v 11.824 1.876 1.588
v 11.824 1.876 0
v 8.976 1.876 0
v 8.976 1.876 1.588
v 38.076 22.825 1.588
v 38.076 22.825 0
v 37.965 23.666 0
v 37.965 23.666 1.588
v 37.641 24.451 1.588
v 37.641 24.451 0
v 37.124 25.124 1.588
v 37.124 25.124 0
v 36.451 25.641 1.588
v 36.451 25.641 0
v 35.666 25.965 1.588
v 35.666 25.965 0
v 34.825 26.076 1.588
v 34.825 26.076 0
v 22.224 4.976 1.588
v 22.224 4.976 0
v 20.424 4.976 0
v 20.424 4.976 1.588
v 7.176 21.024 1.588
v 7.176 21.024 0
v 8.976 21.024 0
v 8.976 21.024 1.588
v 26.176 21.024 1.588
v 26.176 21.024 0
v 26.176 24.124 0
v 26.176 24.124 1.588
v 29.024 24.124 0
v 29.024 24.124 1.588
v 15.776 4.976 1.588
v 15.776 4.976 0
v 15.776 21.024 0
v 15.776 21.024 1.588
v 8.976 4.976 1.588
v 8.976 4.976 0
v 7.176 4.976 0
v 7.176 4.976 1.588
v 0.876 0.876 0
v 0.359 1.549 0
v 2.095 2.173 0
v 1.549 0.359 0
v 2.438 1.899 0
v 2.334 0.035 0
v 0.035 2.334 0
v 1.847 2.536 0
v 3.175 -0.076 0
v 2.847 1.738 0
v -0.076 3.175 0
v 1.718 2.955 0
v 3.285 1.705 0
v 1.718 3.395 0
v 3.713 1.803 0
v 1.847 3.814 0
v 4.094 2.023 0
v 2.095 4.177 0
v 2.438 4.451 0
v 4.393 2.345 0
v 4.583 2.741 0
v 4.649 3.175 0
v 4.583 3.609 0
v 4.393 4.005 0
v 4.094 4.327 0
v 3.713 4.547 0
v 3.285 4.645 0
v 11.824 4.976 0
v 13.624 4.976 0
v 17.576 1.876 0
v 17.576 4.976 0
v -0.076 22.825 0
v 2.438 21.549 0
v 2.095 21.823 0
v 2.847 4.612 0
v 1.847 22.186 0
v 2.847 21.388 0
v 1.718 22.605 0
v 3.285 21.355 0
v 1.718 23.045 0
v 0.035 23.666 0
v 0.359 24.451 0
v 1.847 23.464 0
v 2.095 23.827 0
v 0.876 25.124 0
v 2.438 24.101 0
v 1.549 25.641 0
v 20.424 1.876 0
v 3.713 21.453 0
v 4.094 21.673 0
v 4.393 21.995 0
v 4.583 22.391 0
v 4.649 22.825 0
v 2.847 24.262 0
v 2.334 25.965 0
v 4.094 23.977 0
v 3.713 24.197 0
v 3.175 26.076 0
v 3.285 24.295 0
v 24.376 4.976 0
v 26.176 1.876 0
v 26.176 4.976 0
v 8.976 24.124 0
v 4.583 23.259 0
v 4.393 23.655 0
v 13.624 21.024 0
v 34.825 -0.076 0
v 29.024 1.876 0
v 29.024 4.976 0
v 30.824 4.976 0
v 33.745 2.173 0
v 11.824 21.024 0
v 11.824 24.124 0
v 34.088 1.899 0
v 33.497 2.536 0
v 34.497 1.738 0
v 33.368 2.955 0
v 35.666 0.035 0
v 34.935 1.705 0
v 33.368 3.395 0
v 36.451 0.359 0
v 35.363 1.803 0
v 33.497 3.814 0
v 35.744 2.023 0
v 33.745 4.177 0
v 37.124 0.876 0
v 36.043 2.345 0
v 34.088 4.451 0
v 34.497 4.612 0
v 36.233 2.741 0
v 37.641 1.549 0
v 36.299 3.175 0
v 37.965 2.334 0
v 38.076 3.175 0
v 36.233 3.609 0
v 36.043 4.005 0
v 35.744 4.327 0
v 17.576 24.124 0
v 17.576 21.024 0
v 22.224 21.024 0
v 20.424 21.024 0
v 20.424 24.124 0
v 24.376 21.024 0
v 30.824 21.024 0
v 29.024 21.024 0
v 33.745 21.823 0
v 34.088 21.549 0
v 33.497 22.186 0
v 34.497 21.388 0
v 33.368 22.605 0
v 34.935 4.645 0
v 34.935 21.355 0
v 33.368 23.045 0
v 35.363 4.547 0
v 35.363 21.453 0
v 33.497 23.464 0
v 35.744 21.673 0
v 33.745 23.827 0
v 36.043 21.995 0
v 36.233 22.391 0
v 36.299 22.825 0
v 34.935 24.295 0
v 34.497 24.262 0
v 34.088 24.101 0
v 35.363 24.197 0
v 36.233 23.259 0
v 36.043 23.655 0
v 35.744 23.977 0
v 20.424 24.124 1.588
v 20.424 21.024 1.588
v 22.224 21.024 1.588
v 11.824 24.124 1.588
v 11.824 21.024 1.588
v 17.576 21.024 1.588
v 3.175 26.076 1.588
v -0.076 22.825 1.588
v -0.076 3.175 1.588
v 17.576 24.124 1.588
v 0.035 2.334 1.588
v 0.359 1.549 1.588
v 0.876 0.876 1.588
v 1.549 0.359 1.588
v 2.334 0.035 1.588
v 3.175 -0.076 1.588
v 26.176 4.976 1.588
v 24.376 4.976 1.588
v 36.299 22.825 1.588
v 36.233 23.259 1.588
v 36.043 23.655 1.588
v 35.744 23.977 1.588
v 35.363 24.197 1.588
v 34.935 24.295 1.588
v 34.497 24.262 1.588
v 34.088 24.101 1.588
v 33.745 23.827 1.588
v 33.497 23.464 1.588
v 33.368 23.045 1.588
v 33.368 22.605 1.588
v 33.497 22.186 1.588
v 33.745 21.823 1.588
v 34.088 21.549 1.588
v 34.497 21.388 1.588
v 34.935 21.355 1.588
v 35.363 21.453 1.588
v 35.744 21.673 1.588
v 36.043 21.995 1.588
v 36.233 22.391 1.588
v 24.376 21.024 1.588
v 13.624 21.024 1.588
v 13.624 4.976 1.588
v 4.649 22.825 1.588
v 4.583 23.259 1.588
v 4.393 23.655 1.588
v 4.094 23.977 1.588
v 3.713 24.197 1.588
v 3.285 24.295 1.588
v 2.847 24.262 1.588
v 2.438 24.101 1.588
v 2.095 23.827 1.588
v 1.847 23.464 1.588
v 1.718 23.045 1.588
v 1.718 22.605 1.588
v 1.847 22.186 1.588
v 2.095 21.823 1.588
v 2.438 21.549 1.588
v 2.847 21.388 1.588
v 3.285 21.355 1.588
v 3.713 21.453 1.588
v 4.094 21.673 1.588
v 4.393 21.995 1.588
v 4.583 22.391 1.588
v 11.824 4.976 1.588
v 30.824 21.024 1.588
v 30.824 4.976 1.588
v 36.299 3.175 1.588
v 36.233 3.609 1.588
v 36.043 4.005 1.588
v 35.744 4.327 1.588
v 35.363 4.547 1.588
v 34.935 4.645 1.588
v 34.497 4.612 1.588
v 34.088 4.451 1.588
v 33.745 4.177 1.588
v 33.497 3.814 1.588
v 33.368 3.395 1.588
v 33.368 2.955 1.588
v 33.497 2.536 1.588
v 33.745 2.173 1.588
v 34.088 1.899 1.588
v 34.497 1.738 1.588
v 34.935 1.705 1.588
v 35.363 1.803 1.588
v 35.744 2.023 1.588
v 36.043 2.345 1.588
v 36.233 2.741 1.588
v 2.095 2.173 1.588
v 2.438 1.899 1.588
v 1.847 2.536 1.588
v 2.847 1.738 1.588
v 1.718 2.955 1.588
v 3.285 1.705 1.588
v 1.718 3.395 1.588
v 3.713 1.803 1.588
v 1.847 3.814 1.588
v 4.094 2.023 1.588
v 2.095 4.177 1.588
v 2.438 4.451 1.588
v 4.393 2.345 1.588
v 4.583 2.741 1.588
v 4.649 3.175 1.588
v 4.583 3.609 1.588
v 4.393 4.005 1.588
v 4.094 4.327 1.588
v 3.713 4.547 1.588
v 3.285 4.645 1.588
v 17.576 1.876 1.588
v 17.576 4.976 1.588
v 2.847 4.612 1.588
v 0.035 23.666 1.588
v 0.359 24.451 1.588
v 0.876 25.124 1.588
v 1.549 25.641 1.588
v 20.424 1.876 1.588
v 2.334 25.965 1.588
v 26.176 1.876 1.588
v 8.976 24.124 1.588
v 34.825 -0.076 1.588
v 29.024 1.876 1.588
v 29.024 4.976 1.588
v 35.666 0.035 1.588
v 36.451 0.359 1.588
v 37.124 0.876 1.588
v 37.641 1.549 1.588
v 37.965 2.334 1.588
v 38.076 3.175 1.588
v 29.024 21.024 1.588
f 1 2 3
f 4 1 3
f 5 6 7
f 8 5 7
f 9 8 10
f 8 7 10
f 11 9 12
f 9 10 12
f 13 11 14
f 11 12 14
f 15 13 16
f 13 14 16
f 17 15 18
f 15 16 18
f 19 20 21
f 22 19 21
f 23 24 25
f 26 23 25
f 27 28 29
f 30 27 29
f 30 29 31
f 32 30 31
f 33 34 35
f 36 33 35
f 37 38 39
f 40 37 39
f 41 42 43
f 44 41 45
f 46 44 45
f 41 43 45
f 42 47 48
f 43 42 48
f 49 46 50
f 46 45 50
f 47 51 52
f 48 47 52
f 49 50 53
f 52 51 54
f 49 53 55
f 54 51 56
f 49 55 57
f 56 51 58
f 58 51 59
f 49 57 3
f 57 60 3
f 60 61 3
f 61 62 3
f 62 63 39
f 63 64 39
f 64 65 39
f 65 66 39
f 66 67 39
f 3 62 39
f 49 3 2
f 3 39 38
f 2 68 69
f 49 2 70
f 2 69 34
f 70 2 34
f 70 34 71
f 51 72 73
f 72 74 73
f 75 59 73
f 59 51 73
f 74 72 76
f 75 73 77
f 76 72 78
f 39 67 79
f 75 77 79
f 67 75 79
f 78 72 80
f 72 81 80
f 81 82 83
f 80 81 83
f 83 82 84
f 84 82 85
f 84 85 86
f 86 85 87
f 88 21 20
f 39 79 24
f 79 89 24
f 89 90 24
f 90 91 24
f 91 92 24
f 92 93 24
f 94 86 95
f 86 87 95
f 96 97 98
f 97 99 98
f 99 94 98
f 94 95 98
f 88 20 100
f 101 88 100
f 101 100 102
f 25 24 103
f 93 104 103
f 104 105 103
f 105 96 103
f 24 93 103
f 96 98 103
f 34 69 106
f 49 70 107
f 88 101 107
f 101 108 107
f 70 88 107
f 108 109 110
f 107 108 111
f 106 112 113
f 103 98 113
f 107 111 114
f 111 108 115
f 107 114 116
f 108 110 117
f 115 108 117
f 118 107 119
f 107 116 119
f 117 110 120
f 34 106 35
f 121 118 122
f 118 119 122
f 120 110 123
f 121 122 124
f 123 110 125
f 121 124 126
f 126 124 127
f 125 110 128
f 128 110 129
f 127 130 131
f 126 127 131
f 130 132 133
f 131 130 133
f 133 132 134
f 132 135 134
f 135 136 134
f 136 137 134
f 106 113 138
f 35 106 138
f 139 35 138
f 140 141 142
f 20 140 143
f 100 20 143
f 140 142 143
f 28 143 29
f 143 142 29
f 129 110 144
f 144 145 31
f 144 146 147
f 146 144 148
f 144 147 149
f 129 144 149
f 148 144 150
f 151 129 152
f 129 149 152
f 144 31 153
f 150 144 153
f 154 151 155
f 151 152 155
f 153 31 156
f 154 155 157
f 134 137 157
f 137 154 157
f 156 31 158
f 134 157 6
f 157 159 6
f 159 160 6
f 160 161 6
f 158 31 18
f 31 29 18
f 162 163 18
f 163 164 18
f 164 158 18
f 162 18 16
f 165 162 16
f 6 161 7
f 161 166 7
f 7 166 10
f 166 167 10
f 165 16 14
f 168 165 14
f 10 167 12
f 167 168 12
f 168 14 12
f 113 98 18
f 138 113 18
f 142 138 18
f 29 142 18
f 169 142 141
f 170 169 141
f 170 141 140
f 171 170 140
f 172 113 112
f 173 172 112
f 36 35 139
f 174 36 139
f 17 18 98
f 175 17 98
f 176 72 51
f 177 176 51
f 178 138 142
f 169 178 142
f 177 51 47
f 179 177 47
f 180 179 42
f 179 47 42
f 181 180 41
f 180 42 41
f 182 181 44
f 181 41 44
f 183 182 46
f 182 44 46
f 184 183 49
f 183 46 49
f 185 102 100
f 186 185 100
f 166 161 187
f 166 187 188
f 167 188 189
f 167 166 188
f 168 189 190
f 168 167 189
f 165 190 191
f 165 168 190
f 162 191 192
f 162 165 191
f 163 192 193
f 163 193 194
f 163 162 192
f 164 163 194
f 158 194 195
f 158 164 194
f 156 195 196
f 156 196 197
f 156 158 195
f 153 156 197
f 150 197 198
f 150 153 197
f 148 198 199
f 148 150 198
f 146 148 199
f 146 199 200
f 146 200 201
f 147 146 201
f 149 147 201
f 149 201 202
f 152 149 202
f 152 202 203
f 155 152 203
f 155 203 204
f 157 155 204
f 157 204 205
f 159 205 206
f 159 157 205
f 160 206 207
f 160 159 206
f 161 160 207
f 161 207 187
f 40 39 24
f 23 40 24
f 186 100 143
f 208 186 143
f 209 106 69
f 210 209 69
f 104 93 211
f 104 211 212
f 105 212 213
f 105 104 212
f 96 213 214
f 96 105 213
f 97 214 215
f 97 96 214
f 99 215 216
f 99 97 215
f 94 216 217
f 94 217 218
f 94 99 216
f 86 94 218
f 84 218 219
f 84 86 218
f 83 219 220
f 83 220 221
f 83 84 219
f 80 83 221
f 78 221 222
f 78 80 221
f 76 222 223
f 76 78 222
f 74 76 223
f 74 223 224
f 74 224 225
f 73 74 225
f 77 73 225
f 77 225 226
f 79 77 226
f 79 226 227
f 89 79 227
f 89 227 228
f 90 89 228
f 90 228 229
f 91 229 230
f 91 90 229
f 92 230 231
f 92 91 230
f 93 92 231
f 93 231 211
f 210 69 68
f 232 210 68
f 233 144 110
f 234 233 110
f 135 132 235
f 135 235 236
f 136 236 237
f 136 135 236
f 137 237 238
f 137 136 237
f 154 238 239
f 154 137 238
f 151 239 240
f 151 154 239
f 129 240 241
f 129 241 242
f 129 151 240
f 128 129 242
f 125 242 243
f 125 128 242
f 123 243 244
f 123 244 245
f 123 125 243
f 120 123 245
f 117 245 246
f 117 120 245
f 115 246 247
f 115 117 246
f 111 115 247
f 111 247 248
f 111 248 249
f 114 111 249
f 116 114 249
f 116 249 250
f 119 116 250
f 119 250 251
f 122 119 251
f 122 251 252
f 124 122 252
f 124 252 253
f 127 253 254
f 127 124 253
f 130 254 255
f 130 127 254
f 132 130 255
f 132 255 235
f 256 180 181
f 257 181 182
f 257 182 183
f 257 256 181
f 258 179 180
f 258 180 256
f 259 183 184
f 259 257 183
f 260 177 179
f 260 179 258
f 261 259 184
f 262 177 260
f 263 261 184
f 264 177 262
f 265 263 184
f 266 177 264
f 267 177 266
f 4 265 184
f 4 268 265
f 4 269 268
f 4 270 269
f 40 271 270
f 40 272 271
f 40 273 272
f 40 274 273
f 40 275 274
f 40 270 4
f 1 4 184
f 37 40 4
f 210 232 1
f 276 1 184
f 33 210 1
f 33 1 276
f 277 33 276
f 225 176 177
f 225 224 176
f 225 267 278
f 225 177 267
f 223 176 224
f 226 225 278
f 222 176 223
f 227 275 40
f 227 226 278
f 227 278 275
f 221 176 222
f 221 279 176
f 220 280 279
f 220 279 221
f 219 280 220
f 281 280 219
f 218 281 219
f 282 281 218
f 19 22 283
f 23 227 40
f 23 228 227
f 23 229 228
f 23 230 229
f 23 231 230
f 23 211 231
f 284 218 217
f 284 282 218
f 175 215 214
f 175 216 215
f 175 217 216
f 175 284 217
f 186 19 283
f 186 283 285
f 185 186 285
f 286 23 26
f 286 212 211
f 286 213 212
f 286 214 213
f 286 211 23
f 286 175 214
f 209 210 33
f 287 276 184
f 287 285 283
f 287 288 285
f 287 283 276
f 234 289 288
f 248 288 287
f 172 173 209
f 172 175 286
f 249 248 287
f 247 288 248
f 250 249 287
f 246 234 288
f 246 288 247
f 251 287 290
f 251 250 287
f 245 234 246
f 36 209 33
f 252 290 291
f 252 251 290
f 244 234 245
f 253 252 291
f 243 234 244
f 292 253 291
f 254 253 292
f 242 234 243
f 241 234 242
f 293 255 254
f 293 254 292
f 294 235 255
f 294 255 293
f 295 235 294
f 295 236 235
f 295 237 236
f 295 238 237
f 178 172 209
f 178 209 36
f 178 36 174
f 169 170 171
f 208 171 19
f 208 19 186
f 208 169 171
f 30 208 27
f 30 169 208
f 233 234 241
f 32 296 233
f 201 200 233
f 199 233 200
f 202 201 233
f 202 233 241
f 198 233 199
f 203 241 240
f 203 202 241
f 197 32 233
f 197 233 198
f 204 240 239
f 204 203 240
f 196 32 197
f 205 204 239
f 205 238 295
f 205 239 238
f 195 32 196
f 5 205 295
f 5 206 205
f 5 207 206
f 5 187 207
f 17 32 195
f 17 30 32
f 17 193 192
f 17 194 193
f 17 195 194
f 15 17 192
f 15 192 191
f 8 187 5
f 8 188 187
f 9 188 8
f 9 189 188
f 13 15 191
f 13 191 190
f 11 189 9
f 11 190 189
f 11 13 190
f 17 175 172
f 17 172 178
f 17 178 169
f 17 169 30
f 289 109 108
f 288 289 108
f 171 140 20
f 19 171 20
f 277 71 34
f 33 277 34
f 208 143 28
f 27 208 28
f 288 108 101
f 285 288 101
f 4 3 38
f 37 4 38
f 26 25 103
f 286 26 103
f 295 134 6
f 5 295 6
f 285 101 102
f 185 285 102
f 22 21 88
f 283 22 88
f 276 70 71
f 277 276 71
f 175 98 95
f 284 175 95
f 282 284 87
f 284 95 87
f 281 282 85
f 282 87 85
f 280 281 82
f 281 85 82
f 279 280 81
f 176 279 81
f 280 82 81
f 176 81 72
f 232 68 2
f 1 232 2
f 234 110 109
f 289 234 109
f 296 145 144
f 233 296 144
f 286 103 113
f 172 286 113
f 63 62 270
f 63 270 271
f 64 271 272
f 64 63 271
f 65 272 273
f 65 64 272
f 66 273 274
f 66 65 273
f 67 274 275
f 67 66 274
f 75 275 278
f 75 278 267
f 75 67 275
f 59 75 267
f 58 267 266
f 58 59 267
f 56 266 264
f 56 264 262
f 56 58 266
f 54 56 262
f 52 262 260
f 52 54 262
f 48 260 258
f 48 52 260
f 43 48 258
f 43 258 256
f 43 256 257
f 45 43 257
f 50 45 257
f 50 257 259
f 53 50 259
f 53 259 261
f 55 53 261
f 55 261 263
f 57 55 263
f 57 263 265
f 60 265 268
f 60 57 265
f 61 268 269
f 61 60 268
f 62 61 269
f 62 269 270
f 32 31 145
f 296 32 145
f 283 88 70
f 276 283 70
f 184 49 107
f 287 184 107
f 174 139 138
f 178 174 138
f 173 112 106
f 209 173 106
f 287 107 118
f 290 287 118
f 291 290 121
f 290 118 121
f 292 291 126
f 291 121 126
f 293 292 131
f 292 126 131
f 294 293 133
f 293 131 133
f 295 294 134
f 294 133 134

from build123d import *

# Parameters (mm, degrees)
SKETCH2_W              = 38
SKETCH2_H              = 26
BOSS_EXTRUDE1_DEPTH    = 1.5875
CUT_EXTRUDE1_DEPTH     = 47.070816753
FILLET1_R              = 3.175
SKETCH6_R              = 1.55
CUT_EXTRUDE2_DEPTH     = 47.070816753
MOVE_FACE1_OUTLINE_R   = 1.55
MOVE_FACE1_OUTLINE_R_2 = 1.4738
MOVE_FACE1_DEPTH       = 1.5875


# Read off the part's stored shape, not the designer's step: Move Face1
with BuildPart() as part:
    # Sketch2 → Boss-Extrude1 (new body)
    with BuildSketch(Plane.XY):
        with Locations((19, 13)):
            Rectangle(SKETCH2_W, SKETCH2_H)
    extrude(amount=BOSS_EXTRUDE1_DEPTH)

    # Sketch3 → Cut-Extrude1 (cut, through all)
    with BuildSketch(Plane.XY.offset(1.5875)):
        Polygon((7.1, 21.1), (8.9, 21.1), (8.9, 24.2), (11.9, 24.2), (11.9, 21.1), (13.7, 21.1), (13.7, 4.9), (11.9, 4.9), (11.9, 1.8), (8.9, 1.8), (8.9, 4.9), (7.1, 4.9), align=None)
        Polygon((15.7, 21.1), (17.5, 21.1), (17.5, 24.2), (20.5, 24.2), (20.5, 21.1), (22.3, 21.1), (22.3, 4.9), (20.5, 4.9), (20.5, 1.8), (17.5, 1.8), (17.5, 4.9), (15.7, 4.9), align=None)
        Polygon((24.3, 21.1), (26.1, 21.1), (26.1, 24.2), (29.1, 24.2), (29.1, 21.1), (30.9, 21.1), (30.9, 4.9), (29.1, 4.9), (29.1, 1.8), (26.1, 1.8), (26.1, 4.9), (24.3, 4.9), align=None)
    extrude(amount=-CUT_EXTRUDE1_DEPTH, mode=Mode.SUBTRACT)

    # Fillet1
    fillet1_edges = [part.edges().sort_by_distance(p)[0] for p in [
        (0, 26, 0.79375),
        (38, 26, 0.79375),
        (38, 0, 0.79375),
        (0, 0, 0.79375),
    ]]
    fillet(fillet1_edges, radius=FILLET1_R)

    # Sketch6 → Cut-Extrude2 (cut, through all)
    with BuildSketch(Plane.XY.offset(1.5875)):
        with Locations((3.175, 22.825)):
            Circle(SKETCH6_R)
        with Locations((34.825, 22.825)):
            Circle(SKETCH6_R)
        with Locations((34.825, 3.175)):
            Circle(SKETCH6_R)
        with Locations((3.175, 3.175)):
            Circle(SKETCH6_R)
    extrude(amount=-CUT_EXTRUDE2_DEPTH, mode=Mode.SUBTRACT)

    # Move Face1 outline → Move Face1 (add)
    # profile 1 of 8: a face of its own
    with BuildSketch(Plane.XY):
        with BuildLine():
            Line((-0.0762, 22.825), (-0.0762, 3.175))
            ThreePointArc((-0.0762, 3.175), (0.876054433, 0.876054433), (3.175, -0.0762))
            Line((3.175, -0.0762), (34.825, -0.0762))
            ThreePointArc((34.825, -0.0762), (37.123945567, 0.876054433), (38.0762, 3.175))
            Line((38.0762, 3.175), (38.0762, 22.825))
            ThreePointArc((38.0762, 22.825), (37.123945567, 25.123945567), (34.825, 26.0762))
            Line((34.825, 26.0762), (3.175, 26.0762))
            ThreePointArc((3.175, 26.0762), (0.876054433, 25.123945567), (-0.0762, 22.825))
        make_face()
        with BuildLine():
            ThreePointArc((3.175, 0), (0.92993597, 0.92993597), (0, 3.175))
            Line((0, 3.175), (0, 22.825))
            ThreePointArc((0, 22.825), (0.92993597, 25.07006403), (3.175, 26))
            Line((3.175, 26), (34.825, 26))
            ThreePointArc((34.825, 26), (37.07006403, 25.07006403), (38, 22.825))
            Line((38, 22.825), (38, 3.175))
            ThreePointArc((38, 3.175), (37.07006403, 0.92993597), (34.825, 0))
            Line((34.825, 0), (3.175, 0))
        make_face(mode=Mode.SUBTRACT)
    # profile 2 of 8: a face of its own
    with BuildSketch(Plane.XY):
        Polygon((26.1, 21.1), (24.3, 21.1), (24.3, 4.9), (26.1, 4.9), (26.1, 1.8), (29.1, 1.8), (29.1, 4.9), (30.9, 4.9), (30.9, 21.1), (29.1, 21.1), (29.1, 24.2), (26.1, 24.2), align=None)
        Polygon((24.3762, 4.9762), (24.3762, 21.0238), (26.1762, 21.0238), (26.1762, 24.1238), (29.0238, 24.1238), (29.0238, 21.0238), (30.8238, 21.0238), (30.8238, 4.9762), (29.0238, 4.9762), (29.0238, 1.8762), (26.1762, 1.8762), (26.1762, 4.9762), align=None, mode=Mode.SUBTRACT)
    # profile 3 of 8: a face of its own
    with BuildSketch(Plane.XY):
        Polygon((17.5, 24.2), (17.5, 21.1), (15.7, 21.1), (15.7, 4.9), (17.5, 4.9), (17.5, 1.8), (20.5, 1.8), (20.5, 4.9), (22.3, 4.9), (22.3, 21.1), (20.5, 21.1), (20.5, 24.2), align=None)
        Polygon((15.7762, 21.0238), (17.5762, 21.0238), (17.5762, 24.1238), (20.4238, 24.1238), (20.4238, 21.0238), (22.2238, 21.0238), (22.2238, 4.9762), (20.4238, 4.9762), (20.4238, 1.8762), (17.5762, 1.8762), (17.5762, 4.9762), (15.7762, 4.9762), align=None, mode=Mode.SUBTRACT)
    # profile 4 of 8: a face of its own
    with BuildSketch(Plane.XY):
        Polygon((8.9, 24.2), (8.9, 21.1), (7.1, 21.1), (7.1, 4.9), (8.9, 4.9), (8.9, 1.8), (11.9, 1.8), (11.9, 4.9), (13.7, 4.9), (13.7, 21.1), (11.9, 21.1), (11.9, 24.2), align=None)
        Polygon((7.1762, 21.0238), (8.9762, 21.0238), (8.9762, 24.1238), (11.8238, 24.1238), (11.8238, 21.0238), (13.6238, 21.0238), (13.6238, 4.9762), (11.8238, 4.9762), (11.8238, 1.8762), (8.9762, 1.8762), (8.9762, 4.9762), (7.1762, 4.9762), align=None, mode=Mode.SUBTRACT)
    # profile 5 of 8: a face of its own
    with BuildSketch(Plane.XY):
        with Locations((3.175, 22.825)):
            Circle(MOVE_FACE1_OUTLINE_R)
        with Locations((3.175, 22.825)):
            Circle(MOVE_FACE1_OUTLINE_R_2, mode=Mode.SUBTRACT)
    # profile 6 of 8: a face of its own
    with BuildSketch(Plane.XY):
        with Locations((34.825, 22.825)):
            Circle(MOVE_FACE1_OUTLINE_R)
        with Locations((34.825, 22.825)):
            Circle(MOVE_FACE1_OUTLINE_R_2, mode=Mode.SUBTRACT)
    # profile 7 of 8: a face of its own
    with BuildSketch(Plane.XY):
        with Locations((34.825, 3.175)):
            Circle(MOVE_FACE1_OUTLINE_R)
        with Locations((34.825, 3.175)):
            Circle(MOVE_FACE1_OUTLINE_R_2, mode=Mode.SUBTRACT)
    # profile 8 of 8: a face of its own
    with BuildSketch(Plane.XY):
        with Locations((3.175, 3.175)):
            Circle(MOVE_FACE1_OUTLINE_R)
        with Locations((3.175, 3.175)):
            Circle(MOVE_FACE1_OUTLINE_R_2, mode=Mode.SUBTRACT)
    extrude(amount=MOVE_FACE1_DEPTH)


solid = part.part
